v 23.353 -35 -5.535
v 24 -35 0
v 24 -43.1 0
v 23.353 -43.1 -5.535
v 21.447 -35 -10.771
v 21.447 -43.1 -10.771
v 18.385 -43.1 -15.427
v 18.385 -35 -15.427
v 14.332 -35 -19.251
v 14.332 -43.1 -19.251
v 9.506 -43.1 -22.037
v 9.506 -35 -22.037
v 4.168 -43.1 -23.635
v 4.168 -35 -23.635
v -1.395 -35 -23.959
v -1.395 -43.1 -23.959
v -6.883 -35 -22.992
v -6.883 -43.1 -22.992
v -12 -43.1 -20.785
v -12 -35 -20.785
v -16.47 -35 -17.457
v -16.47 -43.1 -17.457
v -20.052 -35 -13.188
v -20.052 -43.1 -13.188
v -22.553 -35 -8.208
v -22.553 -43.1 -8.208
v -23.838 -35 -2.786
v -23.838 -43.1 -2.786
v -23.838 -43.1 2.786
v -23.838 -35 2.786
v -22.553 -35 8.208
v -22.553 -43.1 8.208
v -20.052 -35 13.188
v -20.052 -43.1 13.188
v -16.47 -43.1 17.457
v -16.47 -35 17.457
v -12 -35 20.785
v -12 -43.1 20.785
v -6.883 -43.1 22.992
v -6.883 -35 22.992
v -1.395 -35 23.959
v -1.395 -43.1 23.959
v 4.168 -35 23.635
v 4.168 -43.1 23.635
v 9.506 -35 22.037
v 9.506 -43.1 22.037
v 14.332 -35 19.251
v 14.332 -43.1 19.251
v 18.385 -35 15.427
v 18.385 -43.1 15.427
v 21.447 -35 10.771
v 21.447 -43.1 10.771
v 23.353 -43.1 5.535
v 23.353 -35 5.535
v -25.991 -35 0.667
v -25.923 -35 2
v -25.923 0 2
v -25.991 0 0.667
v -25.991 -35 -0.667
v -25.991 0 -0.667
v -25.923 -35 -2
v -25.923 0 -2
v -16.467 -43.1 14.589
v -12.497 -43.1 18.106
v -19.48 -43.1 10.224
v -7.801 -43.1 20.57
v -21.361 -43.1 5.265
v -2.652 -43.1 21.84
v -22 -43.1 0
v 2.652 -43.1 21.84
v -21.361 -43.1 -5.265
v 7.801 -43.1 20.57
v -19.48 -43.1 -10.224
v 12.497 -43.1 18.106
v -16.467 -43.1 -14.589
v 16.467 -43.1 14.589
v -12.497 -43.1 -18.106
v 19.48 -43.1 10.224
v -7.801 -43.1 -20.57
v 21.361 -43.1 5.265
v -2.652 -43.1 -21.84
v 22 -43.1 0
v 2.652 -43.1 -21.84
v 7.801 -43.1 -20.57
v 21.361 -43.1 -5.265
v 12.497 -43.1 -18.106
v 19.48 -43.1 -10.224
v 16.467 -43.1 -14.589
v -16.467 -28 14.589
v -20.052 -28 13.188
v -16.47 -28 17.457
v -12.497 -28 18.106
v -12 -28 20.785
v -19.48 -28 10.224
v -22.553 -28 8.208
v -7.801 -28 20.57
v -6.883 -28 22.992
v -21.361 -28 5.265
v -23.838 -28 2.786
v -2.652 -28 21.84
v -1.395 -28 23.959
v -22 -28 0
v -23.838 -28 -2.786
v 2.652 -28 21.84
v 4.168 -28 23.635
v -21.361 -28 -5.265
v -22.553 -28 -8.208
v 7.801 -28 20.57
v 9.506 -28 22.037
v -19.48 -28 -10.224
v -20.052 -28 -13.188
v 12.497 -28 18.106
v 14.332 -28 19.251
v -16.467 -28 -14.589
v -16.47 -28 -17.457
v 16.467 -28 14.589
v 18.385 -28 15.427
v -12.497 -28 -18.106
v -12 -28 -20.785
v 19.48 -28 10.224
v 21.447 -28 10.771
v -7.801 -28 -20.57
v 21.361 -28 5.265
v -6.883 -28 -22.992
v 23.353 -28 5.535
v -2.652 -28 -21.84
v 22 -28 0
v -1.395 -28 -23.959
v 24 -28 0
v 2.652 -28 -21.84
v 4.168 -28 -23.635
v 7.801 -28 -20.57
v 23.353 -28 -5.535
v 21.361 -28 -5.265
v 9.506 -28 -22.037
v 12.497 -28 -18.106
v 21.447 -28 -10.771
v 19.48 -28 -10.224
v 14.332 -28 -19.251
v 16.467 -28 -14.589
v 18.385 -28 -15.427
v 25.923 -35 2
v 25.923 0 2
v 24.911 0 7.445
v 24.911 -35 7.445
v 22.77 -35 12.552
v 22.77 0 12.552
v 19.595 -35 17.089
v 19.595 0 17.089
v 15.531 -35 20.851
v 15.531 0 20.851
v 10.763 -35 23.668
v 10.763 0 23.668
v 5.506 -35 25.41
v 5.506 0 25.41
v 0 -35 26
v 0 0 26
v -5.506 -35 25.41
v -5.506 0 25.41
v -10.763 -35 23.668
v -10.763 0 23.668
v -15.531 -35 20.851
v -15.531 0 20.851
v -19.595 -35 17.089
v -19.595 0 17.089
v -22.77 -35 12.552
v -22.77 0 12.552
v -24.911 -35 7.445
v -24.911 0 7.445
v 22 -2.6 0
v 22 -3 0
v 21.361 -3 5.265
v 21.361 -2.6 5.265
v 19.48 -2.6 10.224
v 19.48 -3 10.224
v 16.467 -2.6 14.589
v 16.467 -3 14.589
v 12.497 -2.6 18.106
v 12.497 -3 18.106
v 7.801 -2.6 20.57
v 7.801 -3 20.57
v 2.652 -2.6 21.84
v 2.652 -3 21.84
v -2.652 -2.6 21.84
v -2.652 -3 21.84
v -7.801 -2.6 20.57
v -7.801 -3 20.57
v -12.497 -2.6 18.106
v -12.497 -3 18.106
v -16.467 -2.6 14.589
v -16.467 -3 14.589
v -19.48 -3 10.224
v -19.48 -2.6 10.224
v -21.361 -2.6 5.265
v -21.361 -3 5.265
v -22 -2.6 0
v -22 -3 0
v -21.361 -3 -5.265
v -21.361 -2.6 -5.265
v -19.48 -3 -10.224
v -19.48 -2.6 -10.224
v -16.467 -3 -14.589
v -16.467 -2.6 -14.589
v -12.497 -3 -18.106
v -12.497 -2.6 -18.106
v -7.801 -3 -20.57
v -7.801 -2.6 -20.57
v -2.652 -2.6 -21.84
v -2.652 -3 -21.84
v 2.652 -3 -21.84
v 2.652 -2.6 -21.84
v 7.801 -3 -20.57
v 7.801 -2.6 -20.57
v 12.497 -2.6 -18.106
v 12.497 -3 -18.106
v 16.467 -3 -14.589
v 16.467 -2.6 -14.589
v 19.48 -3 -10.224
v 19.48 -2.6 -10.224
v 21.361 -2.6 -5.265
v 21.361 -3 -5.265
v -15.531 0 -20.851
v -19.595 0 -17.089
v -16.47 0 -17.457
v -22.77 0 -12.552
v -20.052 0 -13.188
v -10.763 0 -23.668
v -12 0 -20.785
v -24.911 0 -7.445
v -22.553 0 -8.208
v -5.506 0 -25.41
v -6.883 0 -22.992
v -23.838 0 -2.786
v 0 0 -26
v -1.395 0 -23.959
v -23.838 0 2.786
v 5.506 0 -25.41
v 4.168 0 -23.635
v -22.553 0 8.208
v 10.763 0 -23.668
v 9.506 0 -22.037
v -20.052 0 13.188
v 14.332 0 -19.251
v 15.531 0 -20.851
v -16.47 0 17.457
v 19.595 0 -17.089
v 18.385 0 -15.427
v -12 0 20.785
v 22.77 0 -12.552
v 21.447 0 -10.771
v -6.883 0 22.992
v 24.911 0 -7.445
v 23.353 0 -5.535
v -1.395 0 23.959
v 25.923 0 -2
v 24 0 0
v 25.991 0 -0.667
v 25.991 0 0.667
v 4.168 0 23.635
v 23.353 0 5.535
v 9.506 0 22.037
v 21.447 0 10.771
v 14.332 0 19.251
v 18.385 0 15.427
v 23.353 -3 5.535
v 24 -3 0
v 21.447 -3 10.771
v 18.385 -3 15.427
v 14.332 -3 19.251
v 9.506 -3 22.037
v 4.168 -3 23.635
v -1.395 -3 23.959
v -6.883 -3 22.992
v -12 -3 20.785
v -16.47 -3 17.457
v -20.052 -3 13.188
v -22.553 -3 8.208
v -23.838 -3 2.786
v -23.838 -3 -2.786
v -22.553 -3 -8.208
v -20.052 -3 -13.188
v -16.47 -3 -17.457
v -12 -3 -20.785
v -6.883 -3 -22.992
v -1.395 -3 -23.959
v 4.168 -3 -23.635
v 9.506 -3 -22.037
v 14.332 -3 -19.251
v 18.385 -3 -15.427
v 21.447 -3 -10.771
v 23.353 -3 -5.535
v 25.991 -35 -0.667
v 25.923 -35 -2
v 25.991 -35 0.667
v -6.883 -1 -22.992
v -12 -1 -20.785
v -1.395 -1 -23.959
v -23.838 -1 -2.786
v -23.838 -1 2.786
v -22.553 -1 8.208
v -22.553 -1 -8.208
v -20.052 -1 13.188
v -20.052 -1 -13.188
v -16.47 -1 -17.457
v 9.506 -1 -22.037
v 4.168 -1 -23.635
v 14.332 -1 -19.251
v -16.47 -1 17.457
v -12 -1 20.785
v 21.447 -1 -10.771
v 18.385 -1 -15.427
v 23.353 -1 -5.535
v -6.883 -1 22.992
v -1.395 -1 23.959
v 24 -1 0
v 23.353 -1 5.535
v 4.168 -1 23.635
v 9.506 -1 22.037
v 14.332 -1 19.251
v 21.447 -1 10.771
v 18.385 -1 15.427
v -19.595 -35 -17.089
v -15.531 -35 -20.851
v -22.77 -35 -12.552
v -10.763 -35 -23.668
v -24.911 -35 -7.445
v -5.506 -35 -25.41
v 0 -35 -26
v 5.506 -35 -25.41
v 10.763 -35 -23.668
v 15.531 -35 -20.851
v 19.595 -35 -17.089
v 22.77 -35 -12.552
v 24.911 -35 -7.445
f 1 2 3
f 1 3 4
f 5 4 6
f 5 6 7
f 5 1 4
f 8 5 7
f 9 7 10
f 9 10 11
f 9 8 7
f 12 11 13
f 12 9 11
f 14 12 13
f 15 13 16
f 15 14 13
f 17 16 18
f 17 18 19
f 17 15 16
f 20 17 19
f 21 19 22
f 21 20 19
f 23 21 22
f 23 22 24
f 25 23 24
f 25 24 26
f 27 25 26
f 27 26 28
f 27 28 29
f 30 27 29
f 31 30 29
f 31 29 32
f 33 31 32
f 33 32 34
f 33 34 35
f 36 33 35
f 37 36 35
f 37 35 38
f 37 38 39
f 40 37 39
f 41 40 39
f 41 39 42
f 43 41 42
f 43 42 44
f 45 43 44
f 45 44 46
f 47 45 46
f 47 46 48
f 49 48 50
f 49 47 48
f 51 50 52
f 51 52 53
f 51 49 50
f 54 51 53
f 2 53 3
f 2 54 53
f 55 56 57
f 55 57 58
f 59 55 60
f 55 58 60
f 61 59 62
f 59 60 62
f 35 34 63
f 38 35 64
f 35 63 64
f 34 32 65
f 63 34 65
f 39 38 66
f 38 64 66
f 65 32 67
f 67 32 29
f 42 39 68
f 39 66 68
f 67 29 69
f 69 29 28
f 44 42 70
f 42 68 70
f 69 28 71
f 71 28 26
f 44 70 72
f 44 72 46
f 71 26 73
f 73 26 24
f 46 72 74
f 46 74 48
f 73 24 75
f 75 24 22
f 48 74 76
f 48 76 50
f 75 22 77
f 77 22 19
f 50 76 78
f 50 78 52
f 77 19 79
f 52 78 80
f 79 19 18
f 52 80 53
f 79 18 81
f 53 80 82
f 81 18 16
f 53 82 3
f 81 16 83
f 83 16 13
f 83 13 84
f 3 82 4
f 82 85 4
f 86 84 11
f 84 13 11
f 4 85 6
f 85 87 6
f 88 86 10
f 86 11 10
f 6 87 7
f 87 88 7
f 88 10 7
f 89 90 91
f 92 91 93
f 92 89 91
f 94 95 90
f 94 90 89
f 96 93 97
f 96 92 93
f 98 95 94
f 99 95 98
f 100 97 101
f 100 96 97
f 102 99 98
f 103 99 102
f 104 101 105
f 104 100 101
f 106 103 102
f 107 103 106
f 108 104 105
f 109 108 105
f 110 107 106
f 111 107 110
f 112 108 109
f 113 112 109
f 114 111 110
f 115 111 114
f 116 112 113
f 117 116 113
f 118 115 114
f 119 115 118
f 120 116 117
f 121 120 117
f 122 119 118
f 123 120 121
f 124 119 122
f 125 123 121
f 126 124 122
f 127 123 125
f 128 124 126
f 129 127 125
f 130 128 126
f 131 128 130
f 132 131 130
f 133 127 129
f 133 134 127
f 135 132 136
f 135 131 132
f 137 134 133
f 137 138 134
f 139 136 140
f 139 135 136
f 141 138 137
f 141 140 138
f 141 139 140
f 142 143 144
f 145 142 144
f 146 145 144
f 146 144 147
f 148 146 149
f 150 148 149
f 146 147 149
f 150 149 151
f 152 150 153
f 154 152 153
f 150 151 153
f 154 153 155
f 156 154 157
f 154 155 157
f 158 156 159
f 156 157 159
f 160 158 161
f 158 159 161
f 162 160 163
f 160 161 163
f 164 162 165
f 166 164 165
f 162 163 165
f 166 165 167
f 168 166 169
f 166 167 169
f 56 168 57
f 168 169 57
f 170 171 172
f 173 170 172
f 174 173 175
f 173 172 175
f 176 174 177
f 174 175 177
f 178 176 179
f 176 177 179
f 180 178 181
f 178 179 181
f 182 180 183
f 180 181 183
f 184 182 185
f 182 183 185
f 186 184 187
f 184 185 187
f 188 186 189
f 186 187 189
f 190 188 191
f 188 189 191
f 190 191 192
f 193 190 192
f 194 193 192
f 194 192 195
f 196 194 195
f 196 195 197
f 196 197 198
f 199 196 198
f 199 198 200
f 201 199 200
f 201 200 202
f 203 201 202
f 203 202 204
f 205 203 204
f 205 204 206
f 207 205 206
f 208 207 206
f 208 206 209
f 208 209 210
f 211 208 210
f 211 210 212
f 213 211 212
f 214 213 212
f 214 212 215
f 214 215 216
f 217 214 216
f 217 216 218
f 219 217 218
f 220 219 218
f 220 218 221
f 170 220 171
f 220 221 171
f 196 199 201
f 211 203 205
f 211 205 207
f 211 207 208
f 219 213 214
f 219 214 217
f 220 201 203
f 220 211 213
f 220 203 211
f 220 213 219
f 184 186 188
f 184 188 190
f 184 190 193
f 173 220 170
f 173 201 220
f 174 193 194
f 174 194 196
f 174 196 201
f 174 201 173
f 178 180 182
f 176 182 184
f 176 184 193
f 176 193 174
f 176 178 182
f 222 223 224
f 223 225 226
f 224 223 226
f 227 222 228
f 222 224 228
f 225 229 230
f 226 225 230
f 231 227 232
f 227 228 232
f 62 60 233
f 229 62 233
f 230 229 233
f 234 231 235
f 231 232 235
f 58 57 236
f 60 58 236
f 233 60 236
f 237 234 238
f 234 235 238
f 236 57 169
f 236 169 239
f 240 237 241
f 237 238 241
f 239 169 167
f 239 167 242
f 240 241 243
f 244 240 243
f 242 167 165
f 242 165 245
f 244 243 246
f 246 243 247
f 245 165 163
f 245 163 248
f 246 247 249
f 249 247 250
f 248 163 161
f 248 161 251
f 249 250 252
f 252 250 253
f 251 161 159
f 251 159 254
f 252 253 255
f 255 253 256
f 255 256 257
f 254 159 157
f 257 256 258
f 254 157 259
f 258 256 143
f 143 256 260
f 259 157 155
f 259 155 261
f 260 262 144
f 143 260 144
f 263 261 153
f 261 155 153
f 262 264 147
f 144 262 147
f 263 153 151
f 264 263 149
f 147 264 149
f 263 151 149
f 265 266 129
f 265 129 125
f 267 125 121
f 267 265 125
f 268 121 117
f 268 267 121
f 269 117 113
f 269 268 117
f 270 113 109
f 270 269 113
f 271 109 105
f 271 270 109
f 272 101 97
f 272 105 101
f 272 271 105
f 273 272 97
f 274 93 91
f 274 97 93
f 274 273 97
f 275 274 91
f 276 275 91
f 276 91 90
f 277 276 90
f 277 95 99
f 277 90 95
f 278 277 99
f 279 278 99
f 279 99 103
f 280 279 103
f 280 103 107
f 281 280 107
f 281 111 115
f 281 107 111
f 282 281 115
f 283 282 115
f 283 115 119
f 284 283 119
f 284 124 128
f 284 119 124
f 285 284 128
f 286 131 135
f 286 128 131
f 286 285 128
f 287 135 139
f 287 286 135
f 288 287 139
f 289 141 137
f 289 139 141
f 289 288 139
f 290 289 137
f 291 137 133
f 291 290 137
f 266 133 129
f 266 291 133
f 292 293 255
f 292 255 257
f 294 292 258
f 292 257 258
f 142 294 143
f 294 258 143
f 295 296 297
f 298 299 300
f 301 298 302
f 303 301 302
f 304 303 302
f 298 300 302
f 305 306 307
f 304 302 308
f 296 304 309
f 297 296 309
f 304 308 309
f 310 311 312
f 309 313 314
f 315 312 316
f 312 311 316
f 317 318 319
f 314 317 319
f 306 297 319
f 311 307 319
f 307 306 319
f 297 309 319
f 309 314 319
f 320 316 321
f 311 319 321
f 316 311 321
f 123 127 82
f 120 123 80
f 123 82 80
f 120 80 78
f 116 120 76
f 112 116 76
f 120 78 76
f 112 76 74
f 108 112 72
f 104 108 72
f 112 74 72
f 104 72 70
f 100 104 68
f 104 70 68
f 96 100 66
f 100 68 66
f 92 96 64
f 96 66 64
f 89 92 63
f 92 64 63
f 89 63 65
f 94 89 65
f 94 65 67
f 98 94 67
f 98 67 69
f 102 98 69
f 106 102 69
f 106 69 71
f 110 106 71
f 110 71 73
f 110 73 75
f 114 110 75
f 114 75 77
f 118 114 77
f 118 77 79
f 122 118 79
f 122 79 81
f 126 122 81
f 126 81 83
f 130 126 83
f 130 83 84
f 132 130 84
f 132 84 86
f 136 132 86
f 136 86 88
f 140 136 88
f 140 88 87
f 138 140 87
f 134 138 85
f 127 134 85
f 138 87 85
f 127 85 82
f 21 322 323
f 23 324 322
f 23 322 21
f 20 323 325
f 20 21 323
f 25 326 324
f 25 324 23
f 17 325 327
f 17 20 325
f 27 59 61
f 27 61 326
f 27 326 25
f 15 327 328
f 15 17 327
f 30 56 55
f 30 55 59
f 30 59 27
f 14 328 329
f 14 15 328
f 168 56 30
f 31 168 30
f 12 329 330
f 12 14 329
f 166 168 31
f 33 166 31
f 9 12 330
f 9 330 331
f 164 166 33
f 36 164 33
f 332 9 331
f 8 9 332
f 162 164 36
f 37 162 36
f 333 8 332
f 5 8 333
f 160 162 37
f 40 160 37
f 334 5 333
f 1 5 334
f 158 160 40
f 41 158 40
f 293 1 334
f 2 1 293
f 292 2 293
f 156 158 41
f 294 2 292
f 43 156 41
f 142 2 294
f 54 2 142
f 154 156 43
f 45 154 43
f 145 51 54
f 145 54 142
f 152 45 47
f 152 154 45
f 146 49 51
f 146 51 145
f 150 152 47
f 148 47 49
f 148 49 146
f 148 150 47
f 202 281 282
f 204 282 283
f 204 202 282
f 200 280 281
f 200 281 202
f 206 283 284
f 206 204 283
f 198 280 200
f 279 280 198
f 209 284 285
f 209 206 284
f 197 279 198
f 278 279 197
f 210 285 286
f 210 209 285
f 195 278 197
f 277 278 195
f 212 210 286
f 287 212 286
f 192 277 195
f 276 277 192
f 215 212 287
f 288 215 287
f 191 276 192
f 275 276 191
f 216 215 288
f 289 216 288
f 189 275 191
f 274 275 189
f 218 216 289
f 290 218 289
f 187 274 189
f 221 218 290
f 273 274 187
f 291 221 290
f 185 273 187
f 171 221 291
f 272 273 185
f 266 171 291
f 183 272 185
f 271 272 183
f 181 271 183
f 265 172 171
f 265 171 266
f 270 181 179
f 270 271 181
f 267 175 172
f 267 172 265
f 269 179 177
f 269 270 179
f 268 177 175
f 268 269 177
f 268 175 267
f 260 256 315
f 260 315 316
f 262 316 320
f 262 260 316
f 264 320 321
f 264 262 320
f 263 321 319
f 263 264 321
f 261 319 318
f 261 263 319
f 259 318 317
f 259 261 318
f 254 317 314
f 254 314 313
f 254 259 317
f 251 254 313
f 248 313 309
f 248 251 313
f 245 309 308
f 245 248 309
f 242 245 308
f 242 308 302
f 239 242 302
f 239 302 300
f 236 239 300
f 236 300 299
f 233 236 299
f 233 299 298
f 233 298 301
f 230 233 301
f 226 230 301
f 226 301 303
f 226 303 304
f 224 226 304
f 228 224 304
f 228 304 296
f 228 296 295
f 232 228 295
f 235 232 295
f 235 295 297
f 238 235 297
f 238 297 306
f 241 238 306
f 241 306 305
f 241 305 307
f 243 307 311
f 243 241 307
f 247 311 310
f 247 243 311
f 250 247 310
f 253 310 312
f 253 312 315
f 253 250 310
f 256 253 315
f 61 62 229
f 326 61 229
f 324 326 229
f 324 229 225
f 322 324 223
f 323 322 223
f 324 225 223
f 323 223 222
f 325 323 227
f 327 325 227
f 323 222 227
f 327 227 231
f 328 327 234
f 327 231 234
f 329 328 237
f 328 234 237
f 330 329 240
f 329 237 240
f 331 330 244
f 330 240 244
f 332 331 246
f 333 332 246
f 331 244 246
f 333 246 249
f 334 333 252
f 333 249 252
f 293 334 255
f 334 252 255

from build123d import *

# Parameters (mm, degrees)
F0_R      = 24
F1_DEPTH  = 35
F2_START  = 1
F0_R_2    = 22
F2_DEPTH  = 2
F3_START  = -27
F2_FACE_R = 24
F3_DEPTH  = 15.1
F4_R      = 22
F5_DEPTH  = 40.5


with BuildPart() as f1:
    # F0 (on Front) → F1 (new body)
    with BuildSketch(Plane.XZ):
        with BuildLine():
            ThreePointArc((-25.9229627936, 2), (-26, 0), (-25.9229627936, -2))
            ThreePointArc((-25.9229627936, -2), (0, -26), (25.9229627936, -2))
            ThreePointArc((25.9229627936, -2), (26, 0), (25.9229627936, 2))
            ThreePointArc((25.9229627936, 2), (0, 26), (-25.9229627936, 2))
        make_face()
        Circle(F0_R, mode=Mode.SUBTRACT)
    extrude(amount=F1_DEPTH)

    # F0 (on Front) → F2 (join)
    with BuildSketch(Plane.XZ.offset(F2_START)):
        Circle(F0_R)
        Circle(F0_R_2, mode=Mode.SUBTRACT)
        Circle(F0_R_2)
    extrude(amount=F2_DEPTH)

    # F2_face (on face) → F3 (join)
    with BuildSketch(Plane(origin=(0, -1, 0), x_dir=(1, 0, 0), z_dir=(0, 1, 0)).offset(F3_START)):
        Circle(F2_FACE_R)
    extrude(amount=-F3_DEPTH)

    # F4 (on face) → F5 (cut)
    with BuildSketch(Plane.XZ.offset(43.1)):
        Circle(F4_R)
    extrude(amount=-F5_DEPTH, mode=Mode.SUBTRACT)


solid = f1.part
